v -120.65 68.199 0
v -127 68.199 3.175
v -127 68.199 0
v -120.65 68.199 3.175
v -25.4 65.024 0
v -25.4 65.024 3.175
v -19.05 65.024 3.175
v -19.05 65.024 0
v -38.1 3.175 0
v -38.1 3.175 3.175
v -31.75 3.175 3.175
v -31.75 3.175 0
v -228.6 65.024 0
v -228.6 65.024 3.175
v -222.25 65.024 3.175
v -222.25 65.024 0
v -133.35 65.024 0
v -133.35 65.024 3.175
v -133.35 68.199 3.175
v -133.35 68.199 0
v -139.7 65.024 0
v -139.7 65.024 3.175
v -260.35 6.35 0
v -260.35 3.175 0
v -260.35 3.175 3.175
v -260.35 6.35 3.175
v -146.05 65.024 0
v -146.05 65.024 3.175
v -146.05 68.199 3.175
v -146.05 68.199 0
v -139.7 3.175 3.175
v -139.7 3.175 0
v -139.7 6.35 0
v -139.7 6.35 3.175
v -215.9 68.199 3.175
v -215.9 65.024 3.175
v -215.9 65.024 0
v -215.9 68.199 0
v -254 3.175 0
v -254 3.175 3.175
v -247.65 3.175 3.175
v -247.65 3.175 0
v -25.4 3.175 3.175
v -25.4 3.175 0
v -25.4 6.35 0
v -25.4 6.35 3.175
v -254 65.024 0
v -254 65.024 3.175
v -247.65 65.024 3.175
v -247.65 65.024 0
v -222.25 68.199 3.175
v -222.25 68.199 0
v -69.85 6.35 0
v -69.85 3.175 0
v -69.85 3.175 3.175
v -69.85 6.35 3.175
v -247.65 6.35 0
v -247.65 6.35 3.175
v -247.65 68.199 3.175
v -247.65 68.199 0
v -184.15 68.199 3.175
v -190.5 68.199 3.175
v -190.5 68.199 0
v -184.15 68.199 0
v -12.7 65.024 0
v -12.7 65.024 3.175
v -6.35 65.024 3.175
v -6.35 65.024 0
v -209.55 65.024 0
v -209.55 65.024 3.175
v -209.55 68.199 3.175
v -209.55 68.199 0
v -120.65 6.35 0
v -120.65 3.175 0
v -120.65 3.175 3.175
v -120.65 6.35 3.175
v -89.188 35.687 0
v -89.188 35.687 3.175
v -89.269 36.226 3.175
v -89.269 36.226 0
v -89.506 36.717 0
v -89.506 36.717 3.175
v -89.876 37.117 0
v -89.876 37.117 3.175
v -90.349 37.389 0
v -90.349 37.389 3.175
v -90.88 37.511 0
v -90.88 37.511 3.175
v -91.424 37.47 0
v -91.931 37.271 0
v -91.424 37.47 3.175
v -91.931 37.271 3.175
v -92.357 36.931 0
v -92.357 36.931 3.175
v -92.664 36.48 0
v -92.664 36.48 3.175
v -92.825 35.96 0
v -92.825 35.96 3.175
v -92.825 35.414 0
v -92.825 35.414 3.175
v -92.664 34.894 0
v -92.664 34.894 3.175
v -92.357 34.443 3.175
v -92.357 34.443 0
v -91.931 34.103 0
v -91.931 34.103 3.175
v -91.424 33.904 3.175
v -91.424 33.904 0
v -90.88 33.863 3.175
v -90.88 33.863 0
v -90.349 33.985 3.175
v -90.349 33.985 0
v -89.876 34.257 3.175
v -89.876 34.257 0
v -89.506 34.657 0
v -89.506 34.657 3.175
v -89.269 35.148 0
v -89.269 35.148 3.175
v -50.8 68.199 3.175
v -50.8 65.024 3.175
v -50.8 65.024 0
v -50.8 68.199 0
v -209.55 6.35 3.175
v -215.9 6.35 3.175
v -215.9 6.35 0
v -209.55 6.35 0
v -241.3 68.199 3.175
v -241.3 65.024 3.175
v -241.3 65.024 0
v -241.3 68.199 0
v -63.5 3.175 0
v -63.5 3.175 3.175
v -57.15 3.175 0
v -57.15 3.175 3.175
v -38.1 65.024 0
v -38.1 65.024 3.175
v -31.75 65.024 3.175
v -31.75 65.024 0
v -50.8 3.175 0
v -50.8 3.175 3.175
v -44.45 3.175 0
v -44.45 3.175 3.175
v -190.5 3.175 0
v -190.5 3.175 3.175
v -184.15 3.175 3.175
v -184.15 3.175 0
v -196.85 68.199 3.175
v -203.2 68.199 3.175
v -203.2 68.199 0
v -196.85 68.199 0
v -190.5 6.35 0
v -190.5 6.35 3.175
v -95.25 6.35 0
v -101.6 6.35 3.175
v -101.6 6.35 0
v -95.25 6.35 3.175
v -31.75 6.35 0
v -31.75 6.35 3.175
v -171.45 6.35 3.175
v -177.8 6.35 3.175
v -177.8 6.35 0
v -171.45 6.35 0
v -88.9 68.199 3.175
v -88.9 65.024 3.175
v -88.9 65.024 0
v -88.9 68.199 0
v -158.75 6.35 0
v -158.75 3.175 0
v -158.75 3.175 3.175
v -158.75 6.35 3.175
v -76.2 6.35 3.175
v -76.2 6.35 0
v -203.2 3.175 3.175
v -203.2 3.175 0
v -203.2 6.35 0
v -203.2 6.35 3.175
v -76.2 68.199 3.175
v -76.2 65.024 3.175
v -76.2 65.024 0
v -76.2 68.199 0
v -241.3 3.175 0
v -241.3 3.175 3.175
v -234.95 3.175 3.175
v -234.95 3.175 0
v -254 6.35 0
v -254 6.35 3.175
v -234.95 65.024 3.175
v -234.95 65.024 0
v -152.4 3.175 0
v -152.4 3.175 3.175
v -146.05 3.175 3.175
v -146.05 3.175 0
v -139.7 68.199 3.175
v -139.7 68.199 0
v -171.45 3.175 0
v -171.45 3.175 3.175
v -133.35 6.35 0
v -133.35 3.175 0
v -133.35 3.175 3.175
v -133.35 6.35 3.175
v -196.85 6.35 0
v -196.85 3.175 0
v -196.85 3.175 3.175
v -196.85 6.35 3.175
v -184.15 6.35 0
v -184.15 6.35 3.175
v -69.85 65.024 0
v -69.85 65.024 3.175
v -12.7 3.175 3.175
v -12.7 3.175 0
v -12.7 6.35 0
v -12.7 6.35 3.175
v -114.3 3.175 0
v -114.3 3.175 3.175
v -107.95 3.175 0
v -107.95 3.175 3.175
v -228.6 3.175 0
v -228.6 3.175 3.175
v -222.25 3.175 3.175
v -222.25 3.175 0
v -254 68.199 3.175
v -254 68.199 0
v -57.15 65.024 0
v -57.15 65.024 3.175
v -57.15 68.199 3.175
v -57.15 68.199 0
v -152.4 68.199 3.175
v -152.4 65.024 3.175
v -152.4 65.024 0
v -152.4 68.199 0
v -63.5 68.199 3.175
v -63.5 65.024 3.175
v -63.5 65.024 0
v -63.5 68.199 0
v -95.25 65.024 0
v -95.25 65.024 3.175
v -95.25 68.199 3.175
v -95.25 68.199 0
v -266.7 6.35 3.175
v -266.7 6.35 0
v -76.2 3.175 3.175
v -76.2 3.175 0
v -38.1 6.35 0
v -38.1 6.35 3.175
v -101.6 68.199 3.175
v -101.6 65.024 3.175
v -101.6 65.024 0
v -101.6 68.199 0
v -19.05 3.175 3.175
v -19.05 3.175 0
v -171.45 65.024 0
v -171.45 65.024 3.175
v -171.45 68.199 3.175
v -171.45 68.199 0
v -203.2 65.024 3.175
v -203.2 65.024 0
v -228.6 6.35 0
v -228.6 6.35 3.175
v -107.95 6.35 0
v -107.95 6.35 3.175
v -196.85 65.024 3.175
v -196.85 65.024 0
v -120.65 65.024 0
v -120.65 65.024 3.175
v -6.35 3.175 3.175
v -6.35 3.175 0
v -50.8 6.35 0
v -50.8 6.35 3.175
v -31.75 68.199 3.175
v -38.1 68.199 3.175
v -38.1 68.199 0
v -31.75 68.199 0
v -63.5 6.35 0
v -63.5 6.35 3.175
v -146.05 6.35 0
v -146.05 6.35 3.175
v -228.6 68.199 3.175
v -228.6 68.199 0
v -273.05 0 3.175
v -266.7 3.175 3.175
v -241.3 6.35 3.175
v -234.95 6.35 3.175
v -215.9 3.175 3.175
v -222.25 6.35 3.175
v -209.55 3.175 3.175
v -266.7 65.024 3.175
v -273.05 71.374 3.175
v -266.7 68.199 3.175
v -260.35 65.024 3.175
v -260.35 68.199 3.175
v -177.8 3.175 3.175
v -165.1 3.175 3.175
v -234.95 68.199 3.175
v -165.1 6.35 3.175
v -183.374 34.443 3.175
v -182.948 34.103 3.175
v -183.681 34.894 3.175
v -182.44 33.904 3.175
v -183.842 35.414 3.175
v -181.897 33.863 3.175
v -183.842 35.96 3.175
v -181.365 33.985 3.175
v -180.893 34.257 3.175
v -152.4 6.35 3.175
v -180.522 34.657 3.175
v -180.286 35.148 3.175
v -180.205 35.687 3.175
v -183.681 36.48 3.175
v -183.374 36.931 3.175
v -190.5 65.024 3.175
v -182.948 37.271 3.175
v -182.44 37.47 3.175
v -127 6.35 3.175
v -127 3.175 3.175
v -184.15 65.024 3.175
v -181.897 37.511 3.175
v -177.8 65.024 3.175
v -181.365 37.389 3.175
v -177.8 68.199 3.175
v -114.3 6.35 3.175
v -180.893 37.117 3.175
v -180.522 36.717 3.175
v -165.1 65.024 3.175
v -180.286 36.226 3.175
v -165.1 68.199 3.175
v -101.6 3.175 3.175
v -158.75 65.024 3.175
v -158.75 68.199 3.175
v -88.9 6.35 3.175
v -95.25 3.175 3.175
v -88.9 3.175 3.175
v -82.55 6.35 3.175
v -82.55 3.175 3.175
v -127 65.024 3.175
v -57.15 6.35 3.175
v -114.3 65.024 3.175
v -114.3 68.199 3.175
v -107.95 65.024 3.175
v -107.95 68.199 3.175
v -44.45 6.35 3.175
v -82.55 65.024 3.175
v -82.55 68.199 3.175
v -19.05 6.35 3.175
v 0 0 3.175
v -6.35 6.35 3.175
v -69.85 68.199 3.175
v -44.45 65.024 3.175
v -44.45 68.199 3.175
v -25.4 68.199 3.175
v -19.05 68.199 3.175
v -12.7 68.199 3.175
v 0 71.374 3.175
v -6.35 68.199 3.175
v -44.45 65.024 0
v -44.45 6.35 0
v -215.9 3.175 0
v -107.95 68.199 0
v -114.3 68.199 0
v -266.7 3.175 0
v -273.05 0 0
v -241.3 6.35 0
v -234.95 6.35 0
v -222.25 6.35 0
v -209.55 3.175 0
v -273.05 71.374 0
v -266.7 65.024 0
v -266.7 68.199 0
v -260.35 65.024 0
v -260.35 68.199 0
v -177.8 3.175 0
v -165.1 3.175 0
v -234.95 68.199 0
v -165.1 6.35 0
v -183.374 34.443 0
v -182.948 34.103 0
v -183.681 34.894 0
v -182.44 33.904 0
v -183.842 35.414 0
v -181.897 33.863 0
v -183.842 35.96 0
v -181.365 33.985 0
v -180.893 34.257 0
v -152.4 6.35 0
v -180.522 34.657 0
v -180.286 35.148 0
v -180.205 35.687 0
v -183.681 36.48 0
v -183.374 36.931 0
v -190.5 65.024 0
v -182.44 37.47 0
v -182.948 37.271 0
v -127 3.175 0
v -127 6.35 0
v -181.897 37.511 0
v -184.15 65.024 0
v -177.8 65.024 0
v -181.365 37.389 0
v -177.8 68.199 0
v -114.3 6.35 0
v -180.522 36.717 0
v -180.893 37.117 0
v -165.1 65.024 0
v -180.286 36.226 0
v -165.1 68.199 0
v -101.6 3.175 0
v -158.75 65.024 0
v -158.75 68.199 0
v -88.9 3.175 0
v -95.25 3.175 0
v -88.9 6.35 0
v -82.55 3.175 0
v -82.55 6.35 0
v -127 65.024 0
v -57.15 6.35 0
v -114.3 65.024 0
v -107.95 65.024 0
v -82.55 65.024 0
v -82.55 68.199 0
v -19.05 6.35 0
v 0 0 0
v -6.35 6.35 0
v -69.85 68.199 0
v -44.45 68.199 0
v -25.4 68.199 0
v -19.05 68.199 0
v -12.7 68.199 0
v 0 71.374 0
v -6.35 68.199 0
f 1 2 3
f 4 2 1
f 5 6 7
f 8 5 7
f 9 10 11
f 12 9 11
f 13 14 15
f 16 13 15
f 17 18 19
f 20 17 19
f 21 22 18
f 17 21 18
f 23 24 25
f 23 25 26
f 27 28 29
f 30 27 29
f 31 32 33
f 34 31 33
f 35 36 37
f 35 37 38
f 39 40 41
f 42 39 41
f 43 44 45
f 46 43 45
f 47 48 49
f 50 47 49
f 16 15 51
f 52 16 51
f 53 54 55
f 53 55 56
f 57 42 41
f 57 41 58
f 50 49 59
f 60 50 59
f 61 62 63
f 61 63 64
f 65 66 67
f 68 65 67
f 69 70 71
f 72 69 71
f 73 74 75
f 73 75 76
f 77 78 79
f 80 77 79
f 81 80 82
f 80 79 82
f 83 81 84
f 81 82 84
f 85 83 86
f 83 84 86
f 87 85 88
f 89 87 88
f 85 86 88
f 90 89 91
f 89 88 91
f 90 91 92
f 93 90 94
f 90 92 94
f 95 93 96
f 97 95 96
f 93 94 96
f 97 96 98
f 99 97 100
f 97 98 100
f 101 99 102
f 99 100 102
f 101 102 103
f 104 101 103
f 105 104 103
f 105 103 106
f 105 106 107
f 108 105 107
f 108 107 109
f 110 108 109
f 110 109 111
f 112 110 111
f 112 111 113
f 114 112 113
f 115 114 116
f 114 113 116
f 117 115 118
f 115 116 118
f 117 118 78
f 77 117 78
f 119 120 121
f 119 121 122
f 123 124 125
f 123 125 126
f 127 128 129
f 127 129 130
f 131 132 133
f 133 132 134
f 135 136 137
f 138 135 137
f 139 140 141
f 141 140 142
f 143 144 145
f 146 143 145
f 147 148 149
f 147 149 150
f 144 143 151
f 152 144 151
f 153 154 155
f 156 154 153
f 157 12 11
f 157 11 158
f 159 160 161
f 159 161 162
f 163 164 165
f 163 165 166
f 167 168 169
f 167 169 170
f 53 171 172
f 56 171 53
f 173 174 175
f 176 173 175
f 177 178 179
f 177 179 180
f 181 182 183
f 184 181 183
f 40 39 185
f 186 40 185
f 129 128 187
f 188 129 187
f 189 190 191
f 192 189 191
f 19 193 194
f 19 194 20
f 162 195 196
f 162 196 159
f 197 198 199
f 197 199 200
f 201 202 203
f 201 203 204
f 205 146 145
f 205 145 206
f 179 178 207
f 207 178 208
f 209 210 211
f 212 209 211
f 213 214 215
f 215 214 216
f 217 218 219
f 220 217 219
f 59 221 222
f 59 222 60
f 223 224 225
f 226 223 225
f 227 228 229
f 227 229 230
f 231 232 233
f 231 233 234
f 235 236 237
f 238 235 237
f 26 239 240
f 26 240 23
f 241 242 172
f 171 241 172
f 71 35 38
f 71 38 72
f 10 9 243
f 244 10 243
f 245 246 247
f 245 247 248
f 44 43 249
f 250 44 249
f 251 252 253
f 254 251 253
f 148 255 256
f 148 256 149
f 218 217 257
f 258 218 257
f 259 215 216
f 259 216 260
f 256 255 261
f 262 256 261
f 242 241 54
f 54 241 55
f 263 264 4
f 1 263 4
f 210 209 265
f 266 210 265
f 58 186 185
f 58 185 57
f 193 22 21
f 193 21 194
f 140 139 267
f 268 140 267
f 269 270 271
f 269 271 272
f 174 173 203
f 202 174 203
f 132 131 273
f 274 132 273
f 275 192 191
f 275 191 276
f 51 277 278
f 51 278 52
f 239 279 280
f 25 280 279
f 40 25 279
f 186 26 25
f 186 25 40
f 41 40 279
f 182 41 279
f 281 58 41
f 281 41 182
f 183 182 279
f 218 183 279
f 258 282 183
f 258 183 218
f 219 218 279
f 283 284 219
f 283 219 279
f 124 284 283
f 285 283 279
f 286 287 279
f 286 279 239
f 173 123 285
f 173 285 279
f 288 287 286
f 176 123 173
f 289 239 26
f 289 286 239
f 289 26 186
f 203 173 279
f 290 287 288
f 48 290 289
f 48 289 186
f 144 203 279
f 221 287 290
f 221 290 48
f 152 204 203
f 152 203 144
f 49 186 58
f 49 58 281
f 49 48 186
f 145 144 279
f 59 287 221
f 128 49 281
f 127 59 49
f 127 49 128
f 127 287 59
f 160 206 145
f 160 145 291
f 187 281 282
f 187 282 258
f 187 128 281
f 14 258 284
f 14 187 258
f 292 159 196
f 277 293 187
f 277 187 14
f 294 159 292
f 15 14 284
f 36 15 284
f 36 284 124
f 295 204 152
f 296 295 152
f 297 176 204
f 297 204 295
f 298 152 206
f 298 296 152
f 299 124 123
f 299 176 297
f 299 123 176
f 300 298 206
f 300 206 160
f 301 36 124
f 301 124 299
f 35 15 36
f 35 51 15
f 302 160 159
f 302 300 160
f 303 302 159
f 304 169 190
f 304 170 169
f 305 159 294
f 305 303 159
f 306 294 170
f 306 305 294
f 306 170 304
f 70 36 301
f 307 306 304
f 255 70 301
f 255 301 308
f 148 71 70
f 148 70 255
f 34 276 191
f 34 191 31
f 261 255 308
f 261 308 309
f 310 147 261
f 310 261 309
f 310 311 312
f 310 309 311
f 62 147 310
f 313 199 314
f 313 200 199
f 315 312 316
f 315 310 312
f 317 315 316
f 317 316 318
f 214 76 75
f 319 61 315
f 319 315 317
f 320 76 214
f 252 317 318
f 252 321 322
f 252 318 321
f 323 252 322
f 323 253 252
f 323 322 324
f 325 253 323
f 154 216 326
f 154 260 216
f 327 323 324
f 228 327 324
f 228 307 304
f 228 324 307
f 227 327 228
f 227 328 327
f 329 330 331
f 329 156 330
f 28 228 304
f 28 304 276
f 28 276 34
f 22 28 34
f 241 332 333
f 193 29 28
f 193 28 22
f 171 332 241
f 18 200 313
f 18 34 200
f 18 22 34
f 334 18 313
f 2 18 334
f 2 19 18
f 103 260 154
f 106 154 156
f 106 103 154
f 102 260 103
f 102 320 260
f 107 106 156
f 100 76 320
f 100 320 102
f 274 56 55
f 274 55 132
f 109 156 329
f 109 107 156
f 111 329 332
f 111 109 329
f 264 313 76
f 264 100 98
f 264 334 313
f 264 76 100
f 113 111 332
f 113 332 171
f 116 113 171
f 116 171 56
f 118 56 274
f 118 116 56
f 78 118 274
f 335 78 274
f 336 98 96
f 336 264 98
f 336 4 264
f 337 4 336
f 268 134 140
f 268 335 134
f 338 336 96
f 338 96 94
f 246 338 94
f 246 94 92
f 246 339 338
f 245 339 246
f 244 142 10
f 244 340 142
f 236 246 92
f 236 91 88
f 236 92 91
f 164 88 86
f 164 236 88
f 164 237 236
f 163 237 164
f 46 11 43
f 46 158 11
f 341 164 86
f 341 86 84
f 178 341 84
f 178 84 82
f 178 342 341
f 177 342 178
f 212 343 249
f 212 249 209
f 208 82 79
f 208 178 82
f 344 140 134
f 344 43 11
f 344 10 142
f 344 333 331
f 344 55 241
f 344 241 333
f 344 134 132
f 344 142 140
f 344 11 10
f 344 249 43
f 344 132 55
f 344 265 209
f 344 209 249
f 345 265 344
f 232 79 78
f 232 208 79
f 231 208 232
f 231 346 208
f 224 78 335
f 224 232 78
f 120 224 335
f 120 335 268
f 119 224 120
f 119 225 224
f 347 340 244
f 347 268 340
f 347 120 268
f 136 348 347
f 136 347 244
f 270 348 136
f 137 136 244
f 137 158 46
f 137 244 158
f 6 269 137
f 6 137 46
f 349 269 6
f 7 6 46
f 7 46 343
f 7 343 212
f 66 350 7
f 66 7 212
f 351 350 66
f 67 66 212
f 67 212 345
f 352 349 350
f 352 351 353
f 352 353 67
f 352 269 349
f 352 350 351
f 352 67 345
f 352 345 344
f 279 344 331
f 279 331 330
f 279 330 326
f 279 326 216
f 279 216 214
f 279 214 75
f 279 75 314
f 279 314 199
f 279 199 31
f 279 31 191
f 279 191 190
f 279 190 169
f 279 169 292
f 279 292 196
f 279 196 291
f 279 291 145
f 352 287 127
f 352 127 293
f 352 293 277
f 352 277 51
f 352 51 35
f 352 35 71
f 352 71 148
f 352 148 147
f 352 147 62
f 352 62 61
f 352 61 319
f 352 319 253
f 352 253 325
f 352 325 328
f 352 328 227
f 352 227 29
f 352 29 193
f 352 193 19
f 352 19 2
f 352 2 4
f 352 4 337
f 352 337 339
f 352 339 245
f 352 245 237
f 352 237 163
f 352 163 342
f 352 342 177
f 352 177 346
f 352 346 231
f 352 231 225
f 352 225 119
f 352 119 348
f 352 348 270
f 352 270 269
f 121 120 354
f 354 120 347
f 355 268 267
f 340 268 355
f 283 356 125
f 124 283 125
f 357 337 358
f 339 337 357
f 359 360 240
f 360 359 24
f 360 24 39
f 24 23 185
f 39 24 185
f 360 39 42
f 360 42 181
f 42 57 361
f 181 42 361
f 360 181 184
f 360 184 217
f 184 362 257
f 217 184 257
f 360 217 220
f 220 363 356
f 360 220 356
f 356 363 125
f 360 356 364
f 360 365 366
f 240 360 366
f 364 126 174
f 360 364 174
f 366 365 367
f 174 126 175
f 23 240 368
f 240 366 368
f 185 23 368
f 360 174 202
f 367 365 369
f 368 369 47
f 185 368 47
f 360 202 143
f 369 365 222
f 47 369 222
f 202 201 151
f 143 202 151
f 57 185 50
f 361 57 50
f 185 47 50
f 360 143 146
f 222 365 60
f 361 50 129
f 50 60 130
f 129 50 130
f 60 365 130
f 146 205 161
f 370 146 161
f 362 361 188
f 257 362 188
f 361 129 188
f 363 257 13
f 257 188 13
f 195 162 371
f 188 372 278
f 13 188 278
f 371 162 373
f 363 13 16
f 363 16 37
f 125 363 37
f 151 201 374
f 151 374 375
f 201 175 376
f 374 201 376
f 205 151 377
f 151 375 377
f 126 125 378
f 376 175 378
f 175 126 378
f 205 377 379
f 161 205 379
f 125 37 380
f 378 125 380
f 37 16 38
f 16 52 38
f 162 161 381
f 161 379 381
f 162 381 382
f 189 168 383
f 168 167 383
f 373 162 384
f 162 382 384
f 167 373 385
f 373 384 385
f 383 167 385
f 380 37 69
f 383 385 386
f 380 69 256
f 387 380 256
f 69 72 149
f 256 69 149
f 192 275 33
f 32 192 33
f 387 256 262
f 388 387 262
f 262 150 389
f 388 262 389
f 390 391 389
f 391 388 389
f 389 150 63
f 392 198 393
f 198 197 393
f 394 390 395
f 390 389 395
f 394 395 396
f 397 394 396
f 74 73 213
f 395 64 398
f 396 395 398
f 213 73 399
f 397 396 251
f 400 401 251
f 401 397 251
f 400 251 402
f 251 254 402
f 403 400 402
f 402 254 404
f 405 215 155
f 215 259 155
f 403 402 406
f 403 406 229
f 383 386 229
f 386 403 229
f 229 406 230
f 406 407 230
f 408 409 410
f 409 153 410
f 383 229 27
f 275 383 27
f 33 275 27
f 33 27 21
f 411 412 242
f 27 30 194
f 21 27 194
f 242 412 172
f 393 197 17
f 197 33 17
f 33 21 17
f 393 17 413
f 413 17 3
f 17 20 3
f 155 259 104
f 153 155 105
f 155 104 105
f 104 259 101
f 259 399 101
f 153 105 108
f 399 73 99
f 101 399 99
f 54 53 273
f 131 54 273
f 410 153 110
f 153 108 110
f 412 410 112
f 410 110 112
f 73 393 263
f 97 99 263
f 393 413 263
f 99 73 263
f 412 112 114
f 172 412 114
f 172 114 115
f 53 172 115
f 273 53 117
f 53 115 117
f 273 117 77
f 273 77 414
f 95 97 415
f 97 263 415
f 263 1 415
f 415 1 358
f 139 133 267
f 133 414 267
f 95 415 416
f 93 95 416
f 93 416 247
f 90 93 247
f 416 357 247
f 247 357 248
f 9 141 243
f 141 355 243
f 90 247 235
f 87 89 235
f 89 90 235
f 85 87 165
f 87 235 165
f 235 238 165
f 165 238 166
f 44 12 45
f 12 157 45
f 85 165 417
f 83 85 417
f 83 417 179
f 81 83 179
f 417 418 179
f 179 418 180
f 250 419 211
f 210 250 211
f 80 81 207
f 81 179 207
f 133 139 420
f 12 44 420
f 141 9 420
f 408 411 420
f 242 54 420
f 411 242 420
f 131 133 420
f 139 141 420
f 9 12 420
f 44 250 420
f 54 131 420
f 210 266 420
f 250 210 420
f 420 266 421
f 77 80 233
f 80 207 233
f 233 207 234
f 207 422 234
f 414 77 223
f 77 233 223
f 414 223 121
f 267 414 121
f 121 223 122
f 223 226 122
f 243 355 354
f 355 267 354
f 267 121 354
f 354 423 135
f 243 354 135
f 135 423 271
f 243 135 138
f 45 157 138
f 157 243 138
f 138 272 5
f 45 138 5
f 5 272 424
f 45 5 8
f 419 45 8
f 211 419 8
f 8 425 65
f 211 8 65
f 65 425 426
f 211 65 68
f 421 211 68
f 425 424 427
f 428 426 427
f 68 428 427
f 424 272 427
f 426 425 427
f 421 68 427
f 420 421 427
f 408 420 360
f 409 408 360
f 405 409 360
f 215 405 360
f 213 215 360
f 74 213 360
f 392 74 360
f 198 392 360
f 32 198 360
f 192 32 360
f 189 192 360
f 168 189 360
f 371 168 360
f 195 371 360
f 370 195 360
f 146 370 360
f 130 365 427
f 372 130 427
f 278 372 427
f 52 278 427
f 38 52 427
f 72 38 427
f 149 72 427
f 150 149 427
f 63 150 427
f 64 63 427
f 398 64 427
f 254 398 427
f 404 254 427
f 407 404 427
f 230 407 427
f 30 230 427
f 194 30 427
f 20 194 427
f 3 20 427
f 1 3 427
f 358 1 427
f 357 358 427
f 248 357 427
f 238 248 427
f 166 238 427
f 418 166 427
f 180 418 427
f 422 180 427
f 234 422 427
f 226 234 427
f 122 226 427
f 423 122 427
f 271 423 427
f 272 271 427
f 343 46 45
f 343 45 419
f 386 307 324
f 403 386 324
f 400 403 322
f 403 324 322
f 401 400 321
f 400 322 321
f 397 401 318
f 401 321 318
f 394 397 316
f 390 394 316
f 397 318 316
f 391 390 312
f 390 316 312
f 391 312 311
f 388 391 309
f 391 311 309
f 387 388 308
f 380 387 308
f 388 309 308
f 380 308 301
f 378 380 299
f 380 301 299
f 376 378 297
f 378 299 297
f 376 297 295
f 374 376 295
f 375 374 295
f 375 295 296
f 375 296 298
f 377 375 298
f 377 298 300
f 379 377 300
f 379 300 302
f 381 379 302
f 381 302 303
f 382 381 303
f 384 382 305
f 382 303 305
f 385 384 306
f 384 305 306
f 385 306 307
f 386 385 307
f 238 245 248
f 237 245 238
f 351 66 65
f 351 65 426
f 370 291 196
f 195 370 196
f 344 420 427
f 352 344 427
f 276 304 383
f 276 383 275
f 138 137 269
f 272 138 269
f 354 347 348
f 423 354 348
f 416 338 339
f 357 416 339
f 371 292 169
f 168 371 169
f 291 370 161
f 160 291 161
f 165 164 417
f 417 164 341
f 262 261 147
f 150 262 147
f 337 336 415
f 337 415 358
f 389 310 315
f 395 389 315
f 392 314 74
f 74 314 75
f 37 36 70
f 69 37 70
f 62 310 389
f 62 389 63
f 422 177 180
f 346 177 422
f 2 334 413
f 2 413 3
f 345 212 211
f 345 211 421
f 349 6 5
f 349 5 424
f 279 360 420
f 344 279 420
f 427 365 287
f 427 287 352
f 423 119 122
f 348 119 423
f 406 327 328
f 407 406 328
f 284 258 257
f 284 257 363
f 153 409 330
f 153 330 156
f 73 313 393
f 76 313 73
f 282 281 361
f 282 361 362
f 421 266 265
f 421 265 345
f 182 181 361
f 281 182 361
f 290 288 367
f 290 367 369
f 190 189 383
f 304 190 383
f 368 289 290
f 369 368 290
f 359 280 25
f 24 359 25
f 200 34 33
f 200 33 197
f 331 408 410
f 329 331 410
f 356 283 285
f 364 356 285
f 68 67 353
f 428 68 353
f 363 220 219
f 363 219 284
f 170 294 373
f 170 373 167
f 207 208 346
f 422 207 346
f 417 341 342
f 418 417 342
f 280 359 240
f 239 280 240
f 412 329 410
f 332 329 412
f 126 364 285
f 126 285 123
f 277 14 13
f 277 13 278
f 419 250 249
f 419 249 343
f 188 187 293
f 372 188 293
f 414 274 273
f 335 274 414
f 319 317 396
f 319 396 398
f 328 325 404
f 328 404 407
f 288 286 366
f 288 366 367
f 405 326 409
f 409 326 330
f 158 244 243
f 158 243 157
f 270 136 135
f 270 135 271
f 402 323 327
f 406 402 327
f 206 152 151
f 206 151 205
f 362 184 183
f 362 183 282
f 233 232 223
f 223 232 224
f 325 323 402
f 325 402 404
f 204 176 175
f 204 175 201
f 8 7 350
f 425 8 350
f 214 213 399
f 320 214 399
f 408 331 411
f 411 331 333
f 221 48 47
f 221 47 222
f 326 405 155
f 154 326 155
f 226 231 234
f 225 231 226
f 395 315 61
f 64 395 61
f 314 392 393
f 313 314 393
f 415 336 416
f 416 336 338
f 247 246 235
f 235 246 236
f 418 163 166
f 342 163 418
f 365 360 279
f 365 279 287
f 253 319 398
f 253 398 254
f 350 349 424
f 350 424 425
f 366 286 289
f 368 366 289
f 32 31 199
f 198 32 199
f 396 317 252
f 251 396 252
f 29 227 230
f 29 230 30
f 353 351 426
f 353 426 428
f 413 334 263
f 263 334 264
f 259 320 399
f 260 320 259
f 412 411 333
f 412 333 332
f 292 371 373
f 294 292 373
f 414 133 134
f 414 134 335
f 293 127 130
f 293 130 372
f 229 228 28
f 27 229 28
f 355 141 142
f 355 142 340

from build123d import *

# Parameters (mm, degrees)
F0_W     = 273.05
F0_H     = 71.374
F1_DEPTH = 3.175
F2_R     = 1.8288
F2_W     = 6.35
F2_H     = 3.175
F3_DEPTH = 3.175


with BuildPart() as f1:
    # F0 (on Top) → F1 (new body)
    with BuildSketch(Plane.XY):
        with Locations((-136.525, 35.687)):
            Rectangle(F0_W, F0_H)
    extrude(amount=F1_DEPTH)

    # F2 (on face) → F3 (cut, through all)
    with BuildSketch(Plane.XY.offset(3.175)):
        with Locations((-182.033333, 35.687)):
            Circle(F2_R)
        with Locations((-91.016667, 35.687)):
            Circle(F2_R)
        with Locations((-9.525, 4.7625)):
            Rectangle(F2_W, F2_H)
        with Locations((-9.525, 66.6115)):
            Rectangle(F2_W, F2_H)
        with Locations((-22.225, 66.6115)):
            Rectangle(F2_W, F2_H)
        with Locations((-34.925, 66.6115)):
            Rectangle(F2_W, F2_H)
        with Locations((-47.625, 66.6115)):
            Rectangle(F2_W, F2_H)
        with Locations((-60.325, 66.6115)):
            Rectangle(F2_W, F2_H)
        with Locations((-73.025, 66.6115)):
            Rectangle(F2_W, F2_H)
        with Locations((-85.725, 66.6115)):
            Rectangle(F2_W, F2_H)
        with Locations((-98.425, 66.6115)):
            Rectangle(F2_W, F2_H)
        with Locations((-111.125, 66.6115)):
            Rectangle(F2_W, F2_H)
        with Locations((-123.825, 66.6115)):
            Rectangle(F2_W, F2_H)
        with Locations((-136.525, 66.6115)):
            Rectangle(F2_W, F2_H)
        with Locations((-149.225, 66.6115)):
            Rectangle(F2_W, F2_H)
        with Locations((-161.925, 66.6115)):
            Rectangle(F2_W, F2_H)
        with Locations((-174.625, 66.6115)):
            Rectangle(F2_W, F2_H)
        with Locations((-187.325, 66.6115)):
            Rectangle(F2_W, F2_H)
        with Locations((-200.025, 66.6115)):
            Rectangle(F2_W, F2_H)
        with Locations((-212.725, 66.6115)):
            Rectangle(F2_W, F2_H)
        with Locations((-225.425, 66.6115)):
            Rectangle(F2_W, F2_H)
        with Locations((-238.125, 66.6115)):
            Rectangle(F2_W, F2_H)
        with Locations((-250.825, 66.6115)):
            Rectangle(F2_W, F2_H)
        with Locations((-263.525, 66.6115)):
            Rectangle(F2_W, F2_H)
        with Locations((-276.225, 66.6115)):
            Rectangle(F2_W, F2_H)
        with Locations((-22.225, 4.7625)):
            Rectangle(F2_W, F2_H)
        with Locations((-34.925, 4.7625)):
            Rectangle(F2_W, F2_H)
        with Locations((-47.625, 4.7625)):
            Rectangle(F2_W, F2_H)
        with Locations((-60.325, 4.7625)):
            Rectangle(F2_W, F2_H)
        with Locations((-73.025, 4.7625)):
            Rectangle(F2_W, F2_H)
        with Locations((-85.725, 4.7625)):
            Rectangle(F2_W, F2_H)
        with Locations((-98.425, 4.7625)):
            Rectangle(F2_W, F2_H)
        with Locations((-111.125, 4.7625)):
            Rectangle(F2_W, F2_H)
        with Locations((-123.825, 4.7625)):
            Rectangle(F2_W, F2_H)
        with Locations((-136.525, 4.7625)):
            Rectangle(F2_W, F2_H)
        with Locations((-149.225, 4.7625)):
            Rectangle(F2_W, F2_H)
        with Locations((-161.925, 4.7625)):
            Rectangle(F2_W, F2_H)
        with Locations((-174.625, 4.7625)):
            Rectangle(F2_W, F2_H)
        with Locations((-187.325, 4.7625)):
            Rectangle(F2_W, F2_H)
        with Locations((-200.025, 4.7625)):
            Rectangle(F2_W, F2_H)
        with Locations((-212.725, 4.7625)):
            Rectangle(F2_W, F2_H)
        with Locations((-225.425, 4.7625)):
            Rectangle(F2_W, F2_H)
        with Locations((-238.125, 4.7625)):
            Rectangle(F2_W, F2_H)
        with Locations((-250.825, 4.7625)):
            Rectangle(F2_W, F2_H)
        with Locations((-263.525, 4.7625)):
            Rectangle(F2_W, F2_H)
        with Locations((-276.225, 4.7625)):
            Rectangle(F2_W, F2_H)
    extrude(amount=-F3_DEPTH, mode=Mode.SUBTRACT)


solid = f1.part
